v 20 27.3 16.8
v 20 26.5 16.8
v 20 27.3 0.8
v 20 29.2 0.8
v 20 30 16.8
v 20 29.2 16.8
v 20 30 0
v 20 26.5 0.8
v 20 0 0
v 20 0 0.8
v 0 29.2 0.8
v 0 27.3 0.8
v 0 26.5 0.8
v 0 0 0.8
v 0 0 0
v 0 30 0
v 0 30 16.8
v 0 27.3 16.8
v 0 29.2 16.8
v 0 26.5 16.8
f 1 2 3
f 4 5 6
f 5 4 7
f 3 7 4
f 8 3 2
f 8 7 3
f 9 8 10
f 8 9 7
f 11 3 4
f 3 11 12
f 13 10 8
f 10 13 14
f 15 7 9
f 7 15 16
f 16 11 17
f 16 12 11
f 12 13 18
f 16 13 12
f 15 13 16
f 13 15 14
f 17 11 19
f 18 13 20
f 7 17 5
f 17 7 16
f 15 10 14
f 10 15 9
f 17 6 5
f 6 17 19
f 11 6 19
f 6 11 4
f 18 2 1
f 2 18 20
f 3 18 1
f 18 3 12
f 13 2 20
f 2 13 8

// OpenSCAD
gapWidth = 1.9;
holdersLength = 16;
labelWidth = 20;
labelLength = 30;
thickness = 0.8;

module holder() {
    cube([labelWidth, thickness, holdersLength]);
}

// top part
cube([labelWidth, labelLength, thickness]);
translate([0, labelLength-thickness, thickness]) holder();
translate([0, labelLength-thickness*2-gapWidth, thickness]) holder();
